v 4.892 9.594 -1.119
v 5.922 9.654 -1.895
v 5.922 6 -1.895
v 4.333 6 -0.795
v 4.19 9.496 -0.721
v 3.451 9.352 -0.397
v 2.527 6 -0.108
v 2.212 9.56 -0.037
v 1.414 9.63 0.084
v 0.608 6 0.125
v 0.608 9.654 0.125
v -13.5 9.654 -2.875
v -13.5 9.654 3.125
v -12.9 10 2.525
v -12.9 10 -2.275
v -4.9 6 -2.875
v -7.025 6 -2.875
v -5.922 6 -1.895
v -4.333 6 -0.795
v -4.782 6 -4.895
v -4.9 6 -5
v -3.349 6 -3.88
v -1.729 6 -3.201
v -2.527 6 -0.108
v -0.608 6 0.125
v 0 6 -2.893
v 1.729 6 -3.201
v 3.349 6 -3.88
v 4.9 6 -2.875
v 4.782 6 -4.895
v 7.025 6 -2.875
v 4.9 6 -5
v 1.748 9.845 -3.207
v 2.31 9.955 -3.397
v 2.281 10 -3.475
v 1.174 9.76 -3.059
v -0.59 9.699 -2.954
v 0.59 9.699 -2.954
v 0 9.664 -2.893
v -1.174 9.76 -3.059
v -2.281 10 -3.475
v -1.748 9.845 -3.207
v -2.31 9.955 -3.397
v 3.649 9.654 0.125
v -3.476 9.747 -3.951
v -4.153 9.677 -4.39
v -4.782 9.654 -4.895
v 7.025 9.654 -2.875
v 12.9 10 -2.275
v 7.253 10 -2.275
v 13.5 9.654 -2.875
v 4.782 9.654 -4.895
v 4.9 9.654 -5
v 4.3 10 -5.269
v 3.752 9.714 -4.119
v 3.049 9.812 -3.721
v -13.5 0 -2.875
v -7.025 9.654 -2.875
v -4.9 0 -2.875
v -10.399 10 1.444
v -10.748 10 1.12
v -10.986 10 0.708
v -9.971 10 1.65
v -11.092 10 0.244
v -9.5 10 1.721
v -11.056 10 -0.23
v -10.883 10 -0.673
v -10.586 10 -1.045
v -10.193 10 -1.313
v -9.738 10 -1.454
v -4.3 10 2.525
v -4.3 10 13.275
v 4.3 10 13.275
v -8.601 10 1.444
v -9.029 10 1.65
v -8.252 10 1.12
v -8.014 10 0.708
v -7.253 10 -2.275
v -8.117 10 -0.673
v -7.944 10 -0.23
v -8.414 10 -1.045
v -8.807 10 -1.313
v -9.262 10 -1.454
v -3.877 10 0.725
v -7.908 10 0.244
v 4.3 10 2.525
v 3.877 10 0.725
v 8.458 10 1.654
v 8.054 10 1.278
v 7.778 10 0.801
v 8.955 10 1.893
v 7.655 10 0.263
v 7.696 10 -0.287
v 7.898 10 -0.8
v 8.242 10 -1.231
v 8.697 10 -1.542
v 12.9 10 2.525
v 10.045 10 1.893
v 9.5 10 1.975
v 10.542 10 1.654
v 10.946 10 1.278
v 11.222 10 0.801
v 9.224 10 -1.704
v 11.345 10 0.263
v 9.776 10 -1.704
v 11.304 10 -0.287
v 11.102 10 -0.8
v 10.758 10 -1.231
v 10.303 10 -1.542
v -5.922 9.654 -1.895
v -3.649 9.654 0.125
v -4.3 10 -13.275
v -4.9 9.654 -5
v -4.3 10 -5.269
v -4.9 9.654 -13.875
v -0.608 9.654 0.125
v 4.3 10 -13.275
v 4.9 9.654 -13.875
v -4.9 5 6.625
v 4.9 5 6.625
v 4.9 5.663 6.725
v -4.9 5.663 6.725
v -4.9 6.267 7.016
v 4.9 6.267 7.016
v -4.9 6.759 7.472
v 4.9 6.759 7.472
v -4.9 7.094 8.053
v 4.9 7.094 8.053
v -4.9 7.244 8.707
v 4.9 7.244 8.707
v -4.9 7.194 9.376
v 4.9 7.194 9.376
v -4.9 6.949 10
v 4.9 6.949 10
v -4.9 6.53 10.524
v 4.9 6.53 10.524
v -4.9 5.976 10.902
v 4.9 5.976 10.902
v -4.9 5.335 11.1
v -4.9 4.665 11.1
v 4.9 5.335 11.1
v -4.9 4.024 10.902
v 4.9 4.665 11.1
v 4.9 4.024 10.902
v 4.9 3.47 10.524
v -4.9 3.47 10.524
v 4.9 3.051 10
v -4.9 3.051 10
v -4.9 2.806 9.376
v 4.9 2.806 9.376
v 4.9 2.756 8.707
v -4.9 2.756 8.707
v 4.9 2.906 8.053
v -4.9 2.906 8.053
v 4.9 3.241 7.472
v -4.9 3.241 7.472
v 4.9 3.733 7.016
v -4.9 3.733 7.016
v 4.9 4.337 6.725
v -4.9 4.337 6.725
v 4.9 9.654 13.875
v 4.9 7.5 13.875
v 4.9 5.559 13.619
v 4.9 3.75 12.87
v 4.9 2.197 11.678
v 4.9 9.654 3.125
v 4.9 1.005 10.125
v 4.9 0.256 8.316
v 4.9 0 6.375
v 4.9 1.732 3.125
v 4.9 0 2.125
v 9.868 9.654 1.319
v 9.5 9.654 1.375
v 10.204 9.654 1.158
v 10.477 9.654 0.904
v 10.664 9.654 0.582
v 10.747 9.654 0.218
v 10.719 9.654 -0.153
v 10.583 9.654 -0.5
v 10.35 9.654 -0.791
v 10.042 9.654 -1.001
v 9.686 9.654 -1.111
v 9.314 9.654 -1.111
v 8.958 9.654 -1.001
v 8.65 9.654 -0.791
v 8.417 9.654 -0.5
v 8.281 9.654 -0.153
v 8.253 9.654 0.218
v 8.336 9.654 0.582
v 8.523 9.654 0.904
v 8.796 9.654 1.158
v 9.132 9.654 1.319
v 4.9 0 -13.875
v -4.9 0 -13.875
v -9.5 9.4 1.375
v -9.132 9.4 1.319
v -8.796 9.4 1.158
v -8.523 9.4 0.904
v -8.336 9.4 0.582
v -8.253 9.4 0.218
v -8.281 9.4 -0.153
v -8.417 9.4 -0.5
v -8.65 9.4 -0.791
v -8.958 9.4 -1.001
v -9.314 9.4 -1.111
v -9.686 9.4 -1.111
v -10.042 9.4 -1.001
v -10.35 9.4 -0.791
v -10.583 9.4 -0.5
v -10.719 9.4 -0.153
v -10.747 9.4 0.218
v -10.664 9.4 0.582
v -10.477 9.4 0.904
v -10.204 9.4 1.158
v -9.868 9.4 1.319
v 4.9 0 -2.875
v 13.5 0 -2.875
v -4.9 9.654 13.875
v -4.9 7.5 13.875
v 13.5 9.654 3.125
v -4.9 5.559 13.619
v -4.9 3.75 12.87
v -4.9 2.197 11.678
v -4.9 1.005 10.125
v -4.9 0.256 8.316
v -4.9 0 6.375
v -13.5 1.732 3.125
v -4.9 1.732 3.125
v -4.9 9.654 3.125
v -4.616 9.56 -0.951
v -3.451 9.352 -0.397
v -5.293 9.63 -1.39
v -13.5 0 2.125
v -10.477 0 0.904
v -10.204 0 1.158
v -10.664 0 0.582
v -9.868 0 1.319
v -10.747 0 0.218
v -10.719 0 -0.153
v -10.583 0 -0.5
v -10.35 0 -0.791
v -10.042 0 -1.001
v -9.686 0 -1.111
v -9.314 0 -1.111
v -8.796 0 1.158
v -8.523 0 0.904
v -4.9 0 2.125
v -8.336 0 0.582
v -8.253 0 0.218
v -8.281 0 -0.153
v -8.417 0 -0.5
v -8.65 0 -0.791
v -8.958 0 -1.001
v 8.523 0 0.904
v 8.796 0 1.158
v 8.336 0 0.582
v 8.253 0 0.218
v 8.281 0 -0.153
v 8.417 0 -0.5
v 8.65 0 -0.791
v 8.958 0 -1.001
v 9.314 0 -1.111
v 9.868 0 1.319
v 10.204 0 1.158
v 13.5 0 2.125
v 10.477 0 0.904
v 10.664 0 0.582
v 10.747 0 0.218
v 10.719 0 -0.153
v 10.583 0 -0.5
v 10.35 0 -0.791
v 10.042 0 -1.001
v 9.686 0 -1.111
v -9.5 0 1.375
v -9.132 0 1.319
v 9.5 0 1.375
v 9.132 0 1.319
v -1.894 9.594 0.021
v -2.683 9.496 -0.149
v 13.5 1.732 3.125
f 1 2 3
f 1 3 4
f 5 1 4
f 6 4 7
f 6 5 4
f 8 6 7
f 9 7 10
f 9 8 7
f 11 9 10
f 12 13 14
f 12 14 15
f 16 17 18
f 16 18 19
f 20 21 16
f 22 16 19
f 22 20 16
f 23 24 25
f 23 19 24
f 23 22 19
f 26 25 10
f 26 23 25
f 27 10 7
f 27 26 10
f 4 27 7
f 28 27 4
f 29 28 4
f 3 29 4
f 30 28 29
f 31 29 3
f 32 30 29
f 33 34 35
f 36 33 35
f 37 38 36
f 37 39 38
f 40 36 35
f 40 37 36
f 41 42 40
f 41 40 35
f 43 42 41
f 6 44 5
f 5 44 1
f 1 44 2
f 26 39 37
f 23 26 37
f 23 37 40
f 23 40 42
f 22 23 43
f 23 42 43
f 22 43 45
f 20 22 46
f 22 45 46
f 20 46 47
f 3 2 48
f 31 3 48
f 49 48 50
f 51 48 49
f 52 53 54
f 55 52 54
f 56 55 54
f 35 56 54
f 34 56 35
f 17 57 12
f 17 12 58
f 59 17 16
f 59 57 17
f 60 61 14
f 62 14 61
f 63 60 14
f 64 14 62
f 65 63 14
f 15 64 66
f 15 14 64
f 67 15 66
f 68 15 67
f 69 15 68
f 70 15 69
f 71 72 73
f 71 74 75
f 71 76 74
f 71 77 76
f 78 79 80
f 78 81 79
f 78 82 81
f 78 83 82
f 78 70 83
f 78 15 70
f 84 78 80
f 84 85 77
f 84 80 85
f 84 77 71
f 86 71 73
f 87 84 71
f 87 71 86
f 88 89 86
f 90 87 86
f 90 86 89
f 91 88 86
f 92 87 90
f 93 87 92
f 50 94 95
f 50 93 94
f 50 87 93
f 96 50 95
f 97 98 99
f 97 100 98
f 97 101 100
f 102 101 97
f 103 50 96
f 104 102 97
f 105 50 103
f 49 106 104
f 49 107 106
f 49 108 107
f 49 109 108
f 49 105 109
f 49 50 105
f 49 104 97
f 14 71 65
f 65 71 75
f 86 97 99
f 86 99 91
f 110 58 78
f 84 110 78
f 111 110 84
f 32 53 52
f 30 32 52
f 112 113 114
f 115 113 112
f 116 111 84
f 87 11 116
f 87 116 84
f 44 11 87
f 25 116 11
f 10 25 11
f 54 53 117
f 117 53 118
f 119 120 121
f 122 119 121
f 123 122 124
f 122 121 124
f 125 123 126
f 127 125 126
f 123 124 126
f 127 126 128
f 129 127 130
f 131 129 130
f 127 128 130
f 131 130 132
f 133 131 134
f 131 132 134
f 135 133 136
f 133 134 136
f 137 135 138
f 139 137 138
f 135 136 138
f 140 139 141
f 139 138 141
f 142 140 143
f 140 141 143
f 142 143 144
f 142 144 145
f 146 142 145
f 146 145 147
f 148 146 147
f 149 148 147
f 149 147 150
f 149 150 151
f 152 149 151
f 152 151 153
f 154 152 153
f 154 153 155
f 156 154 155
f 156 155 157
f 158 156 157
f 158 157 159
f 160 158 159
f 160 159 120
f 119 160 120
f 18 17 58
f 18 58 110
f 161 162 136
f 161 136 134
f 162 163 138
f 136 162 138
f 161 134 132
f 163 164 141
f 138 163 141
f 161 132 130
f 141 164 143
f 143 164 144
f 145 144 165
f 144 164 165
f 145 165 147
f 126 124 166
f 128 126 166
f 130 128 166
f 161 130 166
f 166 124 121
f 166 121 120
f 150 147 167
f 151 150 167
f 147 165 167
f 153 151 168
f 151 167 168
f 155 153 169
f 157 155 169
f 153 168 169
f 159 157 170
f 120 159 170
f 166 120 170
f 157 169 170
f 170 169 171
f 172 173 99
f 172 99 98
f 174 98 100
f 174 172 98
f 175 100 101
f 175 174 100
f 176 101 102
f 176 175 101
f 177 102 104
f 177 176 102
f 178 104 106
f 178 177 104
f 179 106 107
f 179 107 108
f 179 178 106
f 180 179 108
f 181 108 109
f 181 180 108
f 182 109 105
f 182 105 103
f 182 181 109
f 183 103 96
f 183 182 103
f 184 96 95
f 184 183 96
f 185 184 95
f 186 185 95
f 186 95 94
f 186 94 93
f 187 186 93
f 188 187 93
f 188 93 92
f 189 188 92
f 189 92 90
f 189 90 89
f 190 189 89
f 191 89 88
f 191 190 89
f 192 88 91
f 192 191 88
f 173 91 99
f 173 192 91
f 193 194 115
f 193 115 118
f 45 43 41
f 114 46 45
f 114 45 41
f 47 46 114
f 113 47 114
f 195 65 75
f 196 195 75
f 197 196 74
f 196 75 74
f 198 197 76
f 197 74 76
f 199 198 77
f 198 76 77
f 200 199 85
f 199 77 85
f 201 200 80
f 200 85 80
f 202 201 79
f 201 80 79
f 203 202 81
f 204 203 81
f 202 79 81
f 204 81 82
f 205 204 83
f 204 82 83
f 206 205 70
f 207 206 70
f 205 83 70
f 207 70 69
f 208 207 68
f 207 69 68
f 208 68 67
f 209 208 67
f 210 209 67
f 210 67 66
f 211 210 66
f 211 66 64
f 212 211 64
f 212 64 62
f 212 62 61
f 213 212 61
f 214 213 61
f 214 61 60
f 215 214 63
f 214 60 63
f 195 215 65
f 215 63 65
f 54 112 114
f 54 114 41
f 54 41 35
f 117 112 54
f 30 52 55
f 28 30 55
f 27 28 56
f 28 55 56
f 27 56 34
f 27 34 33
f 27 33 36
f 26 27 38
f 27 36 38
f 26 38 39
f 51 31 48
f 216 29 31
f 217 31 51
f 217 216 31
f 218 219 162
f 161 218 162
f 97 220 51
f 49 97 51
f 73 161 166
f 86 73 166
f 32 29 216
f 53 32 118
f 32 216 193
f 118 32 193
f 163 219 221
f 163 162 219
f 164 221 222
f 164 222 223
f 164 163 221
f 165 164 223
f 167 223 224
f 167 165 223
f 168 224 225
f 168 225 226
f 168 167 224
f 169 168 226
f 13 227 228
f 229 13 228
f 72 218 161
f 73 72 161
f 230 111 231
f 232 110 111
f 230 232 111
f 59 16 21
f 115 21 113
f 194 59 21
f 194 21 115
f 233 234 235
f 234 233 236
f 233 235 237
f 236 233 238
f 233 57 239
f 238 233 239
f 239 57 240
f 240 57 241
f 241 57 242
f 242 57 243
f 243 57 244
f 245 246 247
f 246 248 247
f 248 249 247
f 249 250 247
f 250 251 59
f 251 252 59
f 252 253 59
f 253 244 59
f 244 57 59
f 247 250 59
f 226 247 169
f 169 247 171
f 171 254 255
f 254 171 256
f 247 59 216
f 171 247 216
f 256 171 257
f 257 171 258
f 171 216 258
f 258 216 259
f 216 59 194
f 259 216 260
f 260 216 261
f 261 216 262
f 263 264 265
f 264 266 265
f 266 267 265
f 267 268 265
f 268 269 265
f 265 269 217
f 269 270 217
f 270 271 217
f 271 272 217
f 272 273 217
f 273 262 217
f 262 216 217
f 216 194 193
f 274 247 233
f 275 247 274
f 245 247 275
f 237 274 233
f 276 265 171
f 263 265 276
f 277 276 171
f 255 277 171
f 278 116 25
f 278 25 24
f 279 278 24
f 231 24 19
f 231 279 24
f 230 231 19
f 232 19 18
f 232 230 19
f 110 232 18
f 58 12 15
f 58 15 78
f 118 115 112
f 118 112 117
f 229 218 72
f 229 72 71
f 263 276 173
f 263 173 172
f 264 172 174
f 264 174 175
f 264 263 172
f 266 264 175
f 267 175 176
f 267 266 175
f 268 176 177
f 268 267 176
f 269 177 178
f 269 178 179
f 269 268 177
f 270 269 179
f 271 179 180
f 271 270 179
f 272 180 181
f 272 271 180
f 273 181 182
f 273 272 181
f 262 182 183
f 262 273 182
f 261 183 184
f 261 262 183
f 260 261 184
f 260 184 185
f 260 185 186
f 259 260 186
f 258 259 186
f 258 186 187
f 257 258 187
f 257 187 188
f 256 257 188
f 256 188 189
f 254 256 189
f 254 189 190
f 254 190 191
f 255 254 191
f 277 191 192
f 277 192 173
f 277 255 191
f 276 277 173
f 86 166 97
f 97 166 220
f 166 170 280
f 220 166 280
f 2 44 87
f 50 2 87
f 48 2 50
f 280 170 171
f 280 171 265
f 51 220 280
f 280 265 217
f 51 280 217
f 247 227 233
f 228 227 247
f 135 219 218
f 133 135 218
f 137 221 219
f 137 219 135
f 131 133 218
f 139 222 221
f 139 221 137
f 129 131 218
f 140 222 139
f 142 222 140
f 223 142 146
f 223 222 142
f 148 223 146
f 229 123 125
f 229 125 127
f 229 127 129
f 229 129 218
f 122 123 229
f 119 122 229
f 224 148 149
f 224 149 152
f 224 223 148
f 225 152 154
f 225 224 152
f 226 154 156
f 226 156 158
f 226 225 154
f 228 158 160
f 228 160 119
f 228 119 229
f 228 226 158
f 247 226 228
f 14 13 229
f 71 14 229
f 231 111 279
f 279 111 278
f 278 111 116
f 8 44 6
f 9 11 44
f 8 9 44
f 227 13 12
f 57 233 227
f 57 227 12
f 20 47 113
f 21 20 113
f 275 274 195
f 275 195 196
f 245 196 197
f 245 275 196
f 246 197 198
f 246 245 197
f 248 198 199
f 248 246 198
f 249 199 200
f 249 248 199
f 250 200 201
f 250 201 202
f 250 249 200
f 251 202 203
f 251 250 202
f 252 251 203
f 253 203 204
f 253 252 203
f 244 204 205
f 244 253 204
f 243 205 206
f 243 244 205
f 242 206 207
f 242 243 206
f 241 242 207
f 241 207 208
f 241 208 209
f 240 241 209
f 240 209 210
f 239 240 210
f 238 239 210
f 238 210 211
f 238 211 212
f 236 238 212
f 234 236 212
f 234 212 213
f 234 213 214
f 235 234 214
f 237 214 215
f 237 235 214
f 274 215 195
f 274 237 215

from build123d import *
from OCP.BRepFilletAPI import BRepFilletAPI_MakeChamfer

# Parameters (mm, degrees)
SKETCH_1_W          = 9.8
SKETCH_1_H          = 11
SKETCH_1_W_2        = 8.6
SKETCH_1_H_2        = 6
SKETCH_1_R          = 1.25
SKETCH_1_H_3        = 10.75
EXTRUDE_1_DEPTH     = 10
SKETCH_3_R          = 2.25
CUT_EXTRUDE_2_DEPTH = 26.121218621
CUT_EXTRUDE_3_DEPTH = 4
FILLET_2_R          = 7.5
CHAMFER_1_SIZE      = 0.6
CHAMFER_1_SIZE2     = 0.346410162
FILLET_3_R          = 8
CHAMFER_3_SIZE      = 1
CHAMFER_3_SIZE2     = 1.732050808


with BuildPart() as part:
    # ｽｹｯﾁ1 → ﾎﾞｽ - 押し出し1 (new body)
    # profile 1 of 5: a face of its own
    with BuildSketch(Plane(origin=(0, 0, 0), x_dir=(1, 0, 0), z_dir=(0, 1, 0))):
        with Locations((0, 8.375)):
            Rectangle(SKETCH_1_W, SKETCH_1_H)
    # profile 2 of 5: a face of its own
    with BuildSketch(Plane(origin=(0, 0, 0), x_dir=(1, 0, 0), z_dir=(0, 1, 0))):
        with Locations((9.2, -0.125)):
            Rectangle(SKETCH_1_W_2, SKETCH_1_H_2)
        with Locations(Location((9.5, -0.125, 0), (0, 0, 270))):
            Circle(SKETCH_1_R, mode=Mode.SUBTRACT)
    # profile 3 of 5: a face of its own
    with BuildSketch(Plane(origin=(0, 0, 0), x_dir=(1, 0, 0), z_dir=(0, 1, 0))):
        with Locations((0, -0.125)):
            Rectangle(SKETCH_1_W, SKETCH_1_H_2)
    # profile 4 of 5: a face of its own
    with BuildSketch(Plane(origin=(0, 0, 0), x_dir=(1, 0, 0), z_dir=(0, 1, 0))):
        with Locations((-9.2, -0.125)):
            Rectangle(SKETCH_1_W_2, SKETCH_1_H_2)
        with Locations(Location((-9.5, -0.125, 0), (0, 0, 270))):
            Circle(SKETCH_1_R, mode=Mode.SUBTRACT)
    # profile 5 of 5: a face of its own
    with BuildSketch(Plane(origin=(0, 0, 0), x_dir=(1, 0, 0), z_dir=(0, 1, 0))):
        with Locations((0, -8.5)):
            Rectangle(SKETCH_1_W, SKETCH_1_H_3)
    extrude(amount=EXTRUDE_1_DEPTH)

    # ｽｹｯﾁ3 → ｶｯﾄ - 押し出し2 (cut, through all)
    with BuildSketch(Plane(origin=(4.9, 0, 0), x_dir=(0, 0, -1), z_dir=(1, 0, 0))):
        with Locations((-8.875, 5)):
            Circle(SKETCH_3_R)
    extrude(amount=-CUT_EXTRUDE_2_DEPTH, mode=Mode.SUBTRACT)

    # ｽｹｯﾁ5 → ｶｯﾄ - 押し出し3 (cut)
    with BuildSketch(Plane(origin=(0, 10, 0), x_dir=(1, 0, 0), z_dir=(0, 1, 0))):
        Polygon((4.9, 5), (2.508885395, 2.875), (-2.508885395, 2.875), (-4.9, 5), (-4.9, 2.875), (-7.025, 2.875), (-3.649308793, -0.125), (3.649308793, -0.125), (7.025, 2.875), (4.9, 2.875), align=None)
    extrude(amount=-CUT_EXTRUDE_3_DEPTH, mode=Mode.SUBTRACT)

    # ﾌｨﾚｯﾄ2
    fillet_2_edges = [part.edges().sort_by_distance(p)[0] for p in [
        (0, 0, 13.875),
    ]]
    fillet(fillet_2_edges, radius=FILLET_2_R)

    # 面取り1: one chamfer whose edges measure the first distance from different faces: ONE call of the kernel's chamfer builder (chamfer() names one face for all edges)
    chamfer_1_edges_1 = [part.edges().sort_by_distance(p)[0] for p in [
        (-10.2625, 10, -2.875),
        (-13.5, 10, 0.125),
        (-9.2, 10, 3.125),
        (-4.9, 10, 8.5),
        (0, 10, 13.875),
        (4.9, 10, 8.5),
        (9.2, 10, 3.125),
        (13.5, 10, 0.125),
        (10.2625, 10, -2.875),
        (-5.337154396, 10, -1.375),
        (0, 10, 0.125),
        (5.337154396, 10, -1.375),
        (9.5, 10, -1.125),
    ]]
    chamfer_1_side_1 = [part.faces().sort_by_distance(p)[0] for p in [
        (0, 10, 4.272957296),
    ]]
    chamfer_1_edges_2 = [part.edges().sort_by_distance(p)[0] for p in [
        (-4.9, 10, -9.4375),
        (4.9, 10, -9.4375),
        (0, 10, -13.875),
        (3.704442697, 10, -3.9375),
        (0, 10, -2.875),
        (-3.704442697, 10, -3.9375),
    ]]
    chamfer_1_side_2 = [part.faces().sort_by_distance(p)[0] for p in [
        (0, 10, -8.612025812),
    ]]
    chamfer_1_edges_3 = [part.edges().sort_by_distance(p)[0] for p in [
        (-9.5, 10, -1.125),
    ]]
    chamfer_1_side_3 = [part.faces().sort_by_distance(p)[0] for p in [
        (-9.5, 5, -1.125),
    ]]
    chamfer_1 = BRepFilletAPI_MakeChamfer(part.part.solid().wrapped)
    for e in chamfer_1_edges_1:
        chamfer_1.Add(CHAMFER_1_SIZE, CHAMFER_1_SIZE2, e.wrapped, chamfer_1_side_1[0].wrapped)  # the first distance lies on this face
    for e in chamfer_1_edges_2:
        chamfer_1.Add(CHAMFER_1_SIZE, CHAMFER_1_SIZE2, e.wrapped, chamfer_1_side_2[0].wrapped)  # the first distance lies on this face
    for e in chamfer_1_edges_3:
        chamfer_1.Add(CHAMFER_1_SIZE, CHAMFER_1_SIZE2, e.wrapped, chamfer_1_side_3[0].wrapped)  # the first distance lies on this face
    add(Compound.cast(chamfer_1.Shape()), mode=Mode.REPLACE)

    # ﾌｨﾚｯﾄ3
    # the kernel refuses this fillet: 8 mm, written as the material it adds along each edge
    with BuildSketch(Plane(origin=(-3.649308793, 17.256412491, 0.125), x_dir=(-0.7474768694815634, 0, -0.6642878364007891), z_dir=(0, -1, 0))) as fillet_3_piece_1_section:
        with BuildLine():
            CenterArc((FILLET_3_R * 0.380141132625, FILLET_3_R), FILLET_3_R, 228.372286683, 41.627713317)
            Line((-FILLET_3_R * 0.284146703776, FILLET_3_R * 0.252523130518), (0, 0))
            Line((0, 0), (FILLET_3_R * 0.380141132625, 0))
        make_face()
    fillet_3_piece_1 = extrude(amount=11.256412491, mode=Mode.PRIVATE)
    fillet_3_piece_1 = split(fillet_3_piece_1, bisect_by=Plane(origin=(-2.381035156, 9.533713371, -0.082632133), z_dir=(0, -0.8660254037844377, 0.5000000000000018)), keep=Keep.TOP, mode=Mode.PRIVATE)
    add(fillet_3_piece_1)
    with BuildSketch(Plane(origin=(-3.649308793, 17.256412491, 0.125), x_dir=(-0.7474768694815634, 0, -0.6642878364007891), z_dir=(0, -1, 0))) as fillet_3_piece_2_section:
        with BuildLine():
            CenterArc((FILLET_3_R * 0.380141132625, FILLET_3_R), FILLET_3_R, 228.372286683, 41.627713317)
            Line((-FILLET_3_R * 0.284146703776, FILLET_3_R * 0.252523130518), (0, 0))
            Line((0, 0), (FILLET_3_R * 0.380141132625, 0))
        make_face()
    fillet_3_piece_2 = extrude(amount=11.256412491, mode=Mode.PRIVATE)
    fillet_3_piece_2 = split(fillet_3_piece_2, bisect_by=Plane(origin=(-4.4593865, 9.533713371, -0.872698967), z_dir=(-0.3321439182003959, -0.8660254037844376, 0.37373843474078333)), keep=Keep.TOP, mode=Mode.PRIVATE)
    add(fillet_3_piece_2)
    with BuildSketch(Plane(origin=(3.649308793, 17.256412491, 0.125), x_dir=(0.7474768694815636, 0, -0.6642878364007891), z_dir=(0, -1, 0))) as fillet_3_piece_3_section:
        with BuildLine():
            CenterArc((FILLET_3_R * 0.380141132625, -FILLET_3_R), FILLET_3_R, 90, 41.627713317)
            Line((-FILLET_3_R * 0.284146703776, -FILLET_3_R * 0.252523130518), (0, 0))
            Line((0, 0), (FILLET_3_R * 0.380141132625, 0))
        make_face()
    fillet_3_piece_3 = extrude(amount=11.256412491, mode=Mode.PRIVATE)
    fillet_3_piece_3 = split(fillet_3_piece_3, bisect_by=Plane(origin=(2.381035156, 9.533713371, -0.082632133), z_dir=(0, -0.8660254037844377, 0.5000000000000018)), keep=Keep.TOP, mode=Mode.PRIVATE)
    add(fillet_3_piece_3)
    with BuildSketch(Plane(origin=(3.649308793, 17.256412491, 0.125), x_dir=(0.7474768694815636, 0, -0.6642878364007891), z_dir=(0, -1, 0))) as fillet_3_piece_4_section:
        with BuildLine():
            CenterArc((FILLET_3_R * 0.380141132625, -FILLET_3_R), FILLET_3_R, 90, 41.627713317)
            Line((-FILLET_3_R * 0.284146703776, -FILLET_3_R * 0.252523130518), (0, 0))
            Line((0, 0), (FILLET_3_R * 0.380141132625, 0))
        make_face()
    fillet_3_piece_4 = extrude(amount=11.256412491, mode=Mode.PRIVATE)
    fillet_3_piece_4 = split(fillet_3_piece_4, bisect_by=Plane(origin=(4.4593865, 9.533713371, -0.872698967), z_dir=(0.3321439182003956, -0.8660254037844377, 0.373738434740783)), keep=Keep.TOP, mode=Mode.PRIVATE)
    add(fillet_3_piece_4)
    # the kernel refuses this fillet: 8 mm, written as the material it takes off along each edge
    with BuildSketch(Plane(origin=(2.508885395, 17.256412491, -2.875), x_dir=(0.7474768694815637, 0, -0.664287836400789), z_dir=(0, -1, 0)), Plane(origin=(-2.508885395, 17.256412491, -2.875), x_dir=(1, 0, 0), z_dir=(0, -1, 0))) as fillet_3_2_piece_1:
        with BuildLine():
            CenterArc((FILLET_3_R * 0.380141132625, -FILLET_3_R), FILLET_3_R, 90, 41.627713317)
            Line((-FILLET_3_R * 0.284146703776, -FILLET_3_R * 0.252523130518), (0, 0))
            Line((0, 0), (FILLET_3_R * 0.380141132625, 0))
        make_face()
    extrude(amount=11.256412491, mode=Mode.SUBTRACT)

    # 面取り3
    chamfer_3_edges = [part.edges().sort_by_distance(p)[0] for p in [
        (9.2, 0, 3.125),
        (-9.2, 0, 3.125),
    ]]
    chamfer_3_side = [part.faces().sort_by_distance(p)[0] for p in [
        (0, 0, -2.510051578),
    ]]
    chamfer(chamfer_3_edges, length=CHAMFER_3_SIZE, length2=CHAMFER_3_SIZE2, reference=chamfer_3_side[0])


solid = part.part
